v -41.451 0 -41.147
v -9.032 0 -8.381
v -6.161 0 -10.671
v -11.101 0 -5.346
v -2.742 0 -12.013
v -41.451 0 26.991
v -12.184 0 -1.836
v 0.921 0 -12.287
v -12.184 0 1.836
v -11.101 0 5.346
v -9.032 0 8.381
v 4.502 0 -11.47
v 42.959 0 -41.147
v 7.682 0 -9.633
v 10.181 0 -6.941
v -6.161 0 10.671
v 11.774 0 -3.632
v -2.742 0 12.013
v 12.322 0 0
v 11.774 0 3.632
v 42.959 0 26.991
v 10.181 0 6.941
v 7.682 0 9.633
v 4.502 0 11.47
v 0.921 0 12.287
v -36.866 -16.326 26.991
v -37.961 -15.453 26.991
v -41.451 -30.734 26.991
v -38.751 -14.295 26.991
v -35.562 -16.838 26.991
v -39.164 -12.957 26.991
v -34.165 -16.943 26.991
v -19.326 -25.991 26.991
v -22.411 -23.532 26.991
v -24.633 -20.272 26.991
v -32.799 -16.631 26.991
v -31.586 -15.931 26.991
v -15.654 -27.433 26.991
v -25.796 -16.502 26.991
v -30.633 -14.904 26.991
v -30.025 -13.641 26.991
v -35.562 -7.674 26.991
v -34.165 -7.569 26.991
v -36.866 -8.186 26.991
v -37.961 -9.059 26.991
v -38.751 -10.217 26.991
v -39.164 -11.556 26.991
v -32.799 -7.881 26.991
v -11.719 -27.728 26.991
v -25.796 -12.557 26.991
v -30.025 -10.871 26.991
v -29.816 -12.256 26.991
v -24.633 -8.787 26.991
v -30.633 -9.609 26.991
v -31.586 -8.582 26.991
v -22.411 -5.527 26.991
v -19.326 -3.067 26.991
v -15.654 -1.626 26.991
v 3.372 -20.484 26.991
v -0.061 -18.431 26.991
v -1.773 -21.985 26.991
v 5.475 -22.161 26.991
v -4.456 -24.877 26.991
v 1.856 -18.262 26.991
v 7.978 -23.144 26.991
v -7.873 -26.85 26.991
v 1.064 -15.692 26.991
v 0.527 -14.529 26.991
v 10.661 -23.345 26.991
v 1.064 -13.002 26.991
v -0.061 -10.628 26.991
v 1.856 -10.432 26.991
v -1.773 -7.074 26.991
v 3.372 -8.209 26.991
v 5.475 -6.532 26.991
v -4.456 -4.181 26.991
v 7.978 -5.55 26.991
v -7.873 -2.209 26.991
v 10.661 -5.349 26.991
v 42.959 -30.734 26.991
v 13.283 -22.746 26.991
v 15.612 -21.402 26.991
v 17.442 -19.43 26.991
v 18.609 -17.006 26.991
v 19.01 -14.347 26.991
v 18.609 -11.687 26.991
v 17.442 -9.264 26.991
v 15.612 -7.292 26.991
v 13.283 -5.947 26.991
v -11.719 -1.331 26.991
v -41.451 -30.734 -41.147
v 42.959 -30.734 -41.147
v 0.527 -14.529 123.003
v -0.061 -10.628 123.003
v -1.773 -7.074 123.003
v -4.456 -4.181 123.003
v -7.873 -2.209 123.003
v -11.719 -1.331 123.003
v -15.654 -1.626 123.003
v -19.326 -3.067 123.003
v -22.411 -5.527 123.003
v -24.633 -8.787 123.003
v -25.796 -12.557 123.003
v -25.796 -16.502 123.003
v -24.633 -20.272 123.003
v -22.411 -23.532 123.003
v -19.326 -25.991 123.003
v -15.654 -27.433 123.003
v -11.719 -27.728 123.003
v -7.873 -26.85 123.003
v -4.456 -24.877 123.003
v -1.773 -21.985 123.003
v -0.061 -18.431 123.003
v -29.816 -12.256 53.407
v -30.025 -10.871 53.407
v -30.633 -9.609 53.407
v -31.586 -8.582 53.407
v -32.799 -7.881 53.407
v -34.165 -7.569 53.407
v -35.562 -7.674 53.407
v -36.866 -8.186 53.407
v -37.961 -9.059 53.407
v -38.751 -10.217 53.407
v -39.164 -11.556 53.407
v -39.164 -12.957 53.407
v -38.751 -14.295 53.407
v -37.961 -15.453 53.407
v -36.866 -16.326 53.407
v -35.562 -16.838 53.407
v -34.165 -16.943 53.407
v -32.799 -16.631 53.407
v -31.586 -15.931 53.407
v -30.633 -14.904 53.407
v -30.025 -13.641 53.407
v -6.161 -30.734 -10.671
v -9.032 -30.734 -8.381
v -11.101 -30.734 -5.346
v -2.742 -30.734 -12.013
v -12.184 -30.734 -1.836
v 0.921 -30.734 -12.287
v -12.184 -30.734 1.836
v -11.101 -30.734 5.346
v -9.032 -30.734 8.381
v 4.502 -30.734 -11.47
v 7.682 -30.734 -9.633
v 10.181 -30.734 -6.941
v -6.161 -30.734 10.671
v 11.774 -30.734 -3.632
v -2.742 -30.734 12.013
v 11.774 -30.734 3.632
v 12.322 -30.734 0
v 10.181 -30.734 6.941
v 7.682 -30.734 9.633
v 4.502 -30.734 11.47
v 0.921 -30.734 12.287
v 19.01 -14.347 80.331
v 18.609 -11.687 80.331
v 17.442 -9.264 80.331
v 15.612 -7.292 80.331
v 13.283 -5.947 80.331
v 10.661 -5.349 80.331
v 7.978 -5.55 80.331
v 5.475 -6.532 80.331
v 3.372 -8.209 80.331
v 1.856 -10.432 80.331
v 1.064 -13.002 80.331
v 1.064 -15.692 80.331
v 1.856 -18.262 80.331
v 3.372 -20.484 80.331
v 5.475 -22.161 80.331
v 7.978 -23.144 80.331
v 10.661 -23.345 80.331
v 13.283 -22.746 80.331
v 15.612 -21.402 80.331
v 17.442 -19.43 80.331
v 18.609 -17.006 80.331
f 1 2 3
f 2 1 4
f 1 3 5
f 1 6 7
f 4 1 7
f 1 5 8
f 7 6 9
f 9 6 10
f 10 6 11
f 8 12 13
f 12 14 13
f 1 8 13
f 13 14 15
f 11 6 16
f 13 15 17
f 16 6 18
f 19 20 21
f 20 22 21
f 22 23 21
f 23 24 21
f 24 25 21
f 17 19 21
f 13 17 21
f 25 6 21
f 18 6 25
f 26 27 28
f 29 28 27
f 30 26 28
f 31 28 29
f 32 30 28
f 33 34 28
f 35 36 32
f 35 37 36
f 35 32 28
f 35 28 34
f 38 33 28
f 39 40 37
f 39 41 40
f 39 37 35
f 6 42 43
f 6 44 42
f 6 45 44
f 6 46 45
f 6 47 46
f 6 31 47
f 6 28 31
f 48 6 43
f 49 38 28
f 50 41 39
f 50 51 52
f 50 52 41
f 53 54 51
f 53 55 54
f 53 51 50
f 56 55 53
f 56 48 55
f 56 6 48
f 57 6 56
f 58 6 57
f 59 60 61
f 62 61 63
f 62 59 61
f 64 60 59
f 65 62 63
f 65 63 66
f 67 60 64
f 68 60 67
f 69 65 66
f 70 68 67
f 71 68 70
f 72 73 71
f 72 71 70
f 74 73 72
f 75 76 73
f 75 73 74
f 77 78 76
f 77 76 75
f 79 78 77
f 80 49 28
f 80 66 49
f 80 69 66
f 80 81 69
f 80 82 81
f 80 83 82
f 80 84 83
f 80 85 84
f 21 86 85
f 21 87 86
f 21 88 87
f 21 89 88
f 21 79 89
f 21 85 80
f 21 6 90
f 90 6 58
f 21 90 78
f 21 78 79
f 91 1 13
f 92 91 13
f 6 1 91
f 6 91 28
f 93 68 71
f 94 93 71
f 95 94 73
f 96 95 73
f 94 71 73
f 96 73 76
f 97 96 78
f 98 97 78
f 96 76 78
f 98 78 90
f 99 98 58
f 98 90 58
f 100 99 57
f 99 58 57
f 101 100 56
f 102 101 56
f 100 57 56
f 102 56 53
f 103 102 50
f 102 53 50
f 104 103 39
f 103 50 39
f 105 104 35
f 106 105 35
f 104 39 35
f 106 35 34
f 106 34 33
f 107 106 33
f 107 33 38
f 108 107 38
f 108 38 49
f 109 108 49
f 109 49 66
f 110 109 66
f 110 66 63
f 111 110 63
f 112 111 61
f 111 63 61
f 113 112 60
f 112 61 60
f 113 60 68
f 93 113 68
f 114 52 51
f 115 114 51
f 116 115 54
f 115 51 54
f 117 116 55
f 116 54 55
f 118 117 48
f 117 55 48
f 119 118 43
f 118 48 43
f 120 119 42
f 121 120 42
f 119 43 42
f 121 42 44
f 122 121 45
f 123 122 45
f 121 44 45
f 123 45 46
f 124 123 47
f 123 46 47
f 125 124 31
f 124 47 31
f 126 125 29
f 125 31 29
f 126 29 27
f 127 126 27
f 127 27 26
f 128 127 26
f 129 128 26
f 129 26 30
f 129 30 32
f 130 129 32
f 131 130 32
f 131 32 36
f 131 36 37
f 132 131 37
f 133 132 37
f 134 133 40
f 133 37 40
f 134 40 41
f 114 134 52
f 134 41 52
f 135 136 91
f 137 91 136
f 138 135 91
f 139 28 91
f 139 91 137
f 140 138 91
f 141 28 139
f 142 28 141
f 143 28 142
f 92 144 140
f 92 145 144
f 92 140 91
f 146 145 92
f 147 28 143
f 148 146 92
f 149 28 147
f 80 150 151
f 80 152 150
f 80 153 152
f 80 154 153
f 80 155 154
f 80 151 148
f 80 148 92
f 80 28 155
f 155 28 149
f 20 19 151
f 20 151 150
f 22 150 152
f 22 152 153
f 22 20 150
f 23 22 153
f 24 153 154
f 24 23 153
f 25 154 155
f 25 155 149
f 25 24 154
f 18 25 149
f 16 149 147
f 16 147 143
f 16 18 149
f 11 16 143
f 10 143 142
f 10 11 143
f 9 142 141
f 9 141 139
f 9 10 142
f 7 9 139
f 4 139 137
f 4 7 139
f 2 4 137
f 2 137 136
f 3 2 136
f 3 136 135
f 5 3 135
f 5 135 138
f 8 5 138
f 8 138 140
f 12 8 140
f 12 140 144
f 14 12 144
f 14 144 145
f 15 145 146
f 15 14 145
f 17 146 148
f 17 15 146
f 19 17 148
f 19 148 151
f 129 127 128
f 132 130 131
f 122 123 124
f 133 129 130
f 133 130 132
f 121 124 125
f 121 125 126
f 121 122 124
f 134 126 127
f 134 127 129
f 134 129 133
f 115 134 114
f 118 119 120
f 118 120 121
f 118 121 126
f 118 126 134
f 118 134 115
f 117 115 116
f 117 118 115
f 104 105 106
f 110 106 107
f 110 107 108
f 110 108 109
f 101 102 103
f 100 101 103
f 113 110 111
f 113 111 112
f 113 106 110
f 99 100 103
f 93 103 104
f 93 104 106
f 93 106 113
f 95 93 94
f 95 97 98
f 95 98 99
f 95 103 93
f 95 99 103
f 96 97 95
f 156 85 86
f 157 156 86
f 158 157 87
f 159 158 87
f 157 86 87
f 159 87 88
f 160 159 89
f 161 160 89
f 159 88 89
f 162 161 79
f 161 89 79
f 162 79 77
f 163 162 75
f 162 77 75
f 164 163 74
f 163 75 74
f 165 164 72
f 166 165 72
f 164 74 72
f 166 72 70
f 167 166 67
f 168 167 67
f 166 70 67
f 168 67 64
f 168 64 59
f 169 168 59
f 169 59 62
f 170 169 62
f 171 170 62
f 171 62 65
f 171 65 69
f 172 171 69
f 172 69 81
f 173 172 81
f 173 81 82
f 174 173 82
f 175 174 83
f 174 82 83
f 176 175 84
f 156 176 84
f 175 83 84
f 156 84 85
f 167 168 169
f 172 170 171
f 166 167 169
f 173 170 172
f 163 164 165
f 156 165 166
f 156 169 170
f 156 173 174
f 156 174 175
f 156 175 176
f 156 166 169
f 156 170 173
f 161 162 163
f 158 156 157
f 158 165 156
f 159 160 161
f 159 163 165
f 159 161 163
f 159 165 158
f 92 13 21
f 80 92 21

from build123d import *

# Parameters (mm, degrees)
F0_W     = 84.4102278352
F0_H     = 68.1378934532
F0_R     = 12.3215660832
F1_DEPTH = 30.734
F2_R     = 13.2353706436
F3_DEPTH = 96.012
F2_R_2   = 9.0233824653
F4_DEPTH = 53.34
F2_R_3   = 4.6999449214
F5_DEPTH = 26.416


with BuildPart() as f1:
    # F0 (on Front) → F1 (new body)
    with BuildSketch(Plane.XZ):
        with Locations((0.754147768, -7.0776222274)):
            Rectangle(F0_W, F0_H)
        Circle(F0_R, mode=Mode.SUBTRACT)
    extrude(amount=F1_DEPTH)

    # F2 (on face) → F3 (join)
    with BuildSketch(Plane.XY.offset(26.9913244992)):
        with Locations((-12.7083817497, -14.5293129608)):
            Circle(F2_R)
    extrude(amount=F3_DEPTH)

    # F2 (on face) → F4 (join)
    with BuildSketch(Plane.XY.offset(26.9913244992)):
        with Locations((9.9861975759, -14.3468007445)):
            Circle(F2_R_2)
    extrude(amount=F4_DEPTH)

    # F2 (on face) → F5 (join)
    with BuildSketch(Plane.XY.offset(26.9913244992)):
        with Locations((-34.5160663128, -12.256086804)):
            Circle(F2_R_3)
    extrude(amount=F5_DEPTH)


solid = f1.part
